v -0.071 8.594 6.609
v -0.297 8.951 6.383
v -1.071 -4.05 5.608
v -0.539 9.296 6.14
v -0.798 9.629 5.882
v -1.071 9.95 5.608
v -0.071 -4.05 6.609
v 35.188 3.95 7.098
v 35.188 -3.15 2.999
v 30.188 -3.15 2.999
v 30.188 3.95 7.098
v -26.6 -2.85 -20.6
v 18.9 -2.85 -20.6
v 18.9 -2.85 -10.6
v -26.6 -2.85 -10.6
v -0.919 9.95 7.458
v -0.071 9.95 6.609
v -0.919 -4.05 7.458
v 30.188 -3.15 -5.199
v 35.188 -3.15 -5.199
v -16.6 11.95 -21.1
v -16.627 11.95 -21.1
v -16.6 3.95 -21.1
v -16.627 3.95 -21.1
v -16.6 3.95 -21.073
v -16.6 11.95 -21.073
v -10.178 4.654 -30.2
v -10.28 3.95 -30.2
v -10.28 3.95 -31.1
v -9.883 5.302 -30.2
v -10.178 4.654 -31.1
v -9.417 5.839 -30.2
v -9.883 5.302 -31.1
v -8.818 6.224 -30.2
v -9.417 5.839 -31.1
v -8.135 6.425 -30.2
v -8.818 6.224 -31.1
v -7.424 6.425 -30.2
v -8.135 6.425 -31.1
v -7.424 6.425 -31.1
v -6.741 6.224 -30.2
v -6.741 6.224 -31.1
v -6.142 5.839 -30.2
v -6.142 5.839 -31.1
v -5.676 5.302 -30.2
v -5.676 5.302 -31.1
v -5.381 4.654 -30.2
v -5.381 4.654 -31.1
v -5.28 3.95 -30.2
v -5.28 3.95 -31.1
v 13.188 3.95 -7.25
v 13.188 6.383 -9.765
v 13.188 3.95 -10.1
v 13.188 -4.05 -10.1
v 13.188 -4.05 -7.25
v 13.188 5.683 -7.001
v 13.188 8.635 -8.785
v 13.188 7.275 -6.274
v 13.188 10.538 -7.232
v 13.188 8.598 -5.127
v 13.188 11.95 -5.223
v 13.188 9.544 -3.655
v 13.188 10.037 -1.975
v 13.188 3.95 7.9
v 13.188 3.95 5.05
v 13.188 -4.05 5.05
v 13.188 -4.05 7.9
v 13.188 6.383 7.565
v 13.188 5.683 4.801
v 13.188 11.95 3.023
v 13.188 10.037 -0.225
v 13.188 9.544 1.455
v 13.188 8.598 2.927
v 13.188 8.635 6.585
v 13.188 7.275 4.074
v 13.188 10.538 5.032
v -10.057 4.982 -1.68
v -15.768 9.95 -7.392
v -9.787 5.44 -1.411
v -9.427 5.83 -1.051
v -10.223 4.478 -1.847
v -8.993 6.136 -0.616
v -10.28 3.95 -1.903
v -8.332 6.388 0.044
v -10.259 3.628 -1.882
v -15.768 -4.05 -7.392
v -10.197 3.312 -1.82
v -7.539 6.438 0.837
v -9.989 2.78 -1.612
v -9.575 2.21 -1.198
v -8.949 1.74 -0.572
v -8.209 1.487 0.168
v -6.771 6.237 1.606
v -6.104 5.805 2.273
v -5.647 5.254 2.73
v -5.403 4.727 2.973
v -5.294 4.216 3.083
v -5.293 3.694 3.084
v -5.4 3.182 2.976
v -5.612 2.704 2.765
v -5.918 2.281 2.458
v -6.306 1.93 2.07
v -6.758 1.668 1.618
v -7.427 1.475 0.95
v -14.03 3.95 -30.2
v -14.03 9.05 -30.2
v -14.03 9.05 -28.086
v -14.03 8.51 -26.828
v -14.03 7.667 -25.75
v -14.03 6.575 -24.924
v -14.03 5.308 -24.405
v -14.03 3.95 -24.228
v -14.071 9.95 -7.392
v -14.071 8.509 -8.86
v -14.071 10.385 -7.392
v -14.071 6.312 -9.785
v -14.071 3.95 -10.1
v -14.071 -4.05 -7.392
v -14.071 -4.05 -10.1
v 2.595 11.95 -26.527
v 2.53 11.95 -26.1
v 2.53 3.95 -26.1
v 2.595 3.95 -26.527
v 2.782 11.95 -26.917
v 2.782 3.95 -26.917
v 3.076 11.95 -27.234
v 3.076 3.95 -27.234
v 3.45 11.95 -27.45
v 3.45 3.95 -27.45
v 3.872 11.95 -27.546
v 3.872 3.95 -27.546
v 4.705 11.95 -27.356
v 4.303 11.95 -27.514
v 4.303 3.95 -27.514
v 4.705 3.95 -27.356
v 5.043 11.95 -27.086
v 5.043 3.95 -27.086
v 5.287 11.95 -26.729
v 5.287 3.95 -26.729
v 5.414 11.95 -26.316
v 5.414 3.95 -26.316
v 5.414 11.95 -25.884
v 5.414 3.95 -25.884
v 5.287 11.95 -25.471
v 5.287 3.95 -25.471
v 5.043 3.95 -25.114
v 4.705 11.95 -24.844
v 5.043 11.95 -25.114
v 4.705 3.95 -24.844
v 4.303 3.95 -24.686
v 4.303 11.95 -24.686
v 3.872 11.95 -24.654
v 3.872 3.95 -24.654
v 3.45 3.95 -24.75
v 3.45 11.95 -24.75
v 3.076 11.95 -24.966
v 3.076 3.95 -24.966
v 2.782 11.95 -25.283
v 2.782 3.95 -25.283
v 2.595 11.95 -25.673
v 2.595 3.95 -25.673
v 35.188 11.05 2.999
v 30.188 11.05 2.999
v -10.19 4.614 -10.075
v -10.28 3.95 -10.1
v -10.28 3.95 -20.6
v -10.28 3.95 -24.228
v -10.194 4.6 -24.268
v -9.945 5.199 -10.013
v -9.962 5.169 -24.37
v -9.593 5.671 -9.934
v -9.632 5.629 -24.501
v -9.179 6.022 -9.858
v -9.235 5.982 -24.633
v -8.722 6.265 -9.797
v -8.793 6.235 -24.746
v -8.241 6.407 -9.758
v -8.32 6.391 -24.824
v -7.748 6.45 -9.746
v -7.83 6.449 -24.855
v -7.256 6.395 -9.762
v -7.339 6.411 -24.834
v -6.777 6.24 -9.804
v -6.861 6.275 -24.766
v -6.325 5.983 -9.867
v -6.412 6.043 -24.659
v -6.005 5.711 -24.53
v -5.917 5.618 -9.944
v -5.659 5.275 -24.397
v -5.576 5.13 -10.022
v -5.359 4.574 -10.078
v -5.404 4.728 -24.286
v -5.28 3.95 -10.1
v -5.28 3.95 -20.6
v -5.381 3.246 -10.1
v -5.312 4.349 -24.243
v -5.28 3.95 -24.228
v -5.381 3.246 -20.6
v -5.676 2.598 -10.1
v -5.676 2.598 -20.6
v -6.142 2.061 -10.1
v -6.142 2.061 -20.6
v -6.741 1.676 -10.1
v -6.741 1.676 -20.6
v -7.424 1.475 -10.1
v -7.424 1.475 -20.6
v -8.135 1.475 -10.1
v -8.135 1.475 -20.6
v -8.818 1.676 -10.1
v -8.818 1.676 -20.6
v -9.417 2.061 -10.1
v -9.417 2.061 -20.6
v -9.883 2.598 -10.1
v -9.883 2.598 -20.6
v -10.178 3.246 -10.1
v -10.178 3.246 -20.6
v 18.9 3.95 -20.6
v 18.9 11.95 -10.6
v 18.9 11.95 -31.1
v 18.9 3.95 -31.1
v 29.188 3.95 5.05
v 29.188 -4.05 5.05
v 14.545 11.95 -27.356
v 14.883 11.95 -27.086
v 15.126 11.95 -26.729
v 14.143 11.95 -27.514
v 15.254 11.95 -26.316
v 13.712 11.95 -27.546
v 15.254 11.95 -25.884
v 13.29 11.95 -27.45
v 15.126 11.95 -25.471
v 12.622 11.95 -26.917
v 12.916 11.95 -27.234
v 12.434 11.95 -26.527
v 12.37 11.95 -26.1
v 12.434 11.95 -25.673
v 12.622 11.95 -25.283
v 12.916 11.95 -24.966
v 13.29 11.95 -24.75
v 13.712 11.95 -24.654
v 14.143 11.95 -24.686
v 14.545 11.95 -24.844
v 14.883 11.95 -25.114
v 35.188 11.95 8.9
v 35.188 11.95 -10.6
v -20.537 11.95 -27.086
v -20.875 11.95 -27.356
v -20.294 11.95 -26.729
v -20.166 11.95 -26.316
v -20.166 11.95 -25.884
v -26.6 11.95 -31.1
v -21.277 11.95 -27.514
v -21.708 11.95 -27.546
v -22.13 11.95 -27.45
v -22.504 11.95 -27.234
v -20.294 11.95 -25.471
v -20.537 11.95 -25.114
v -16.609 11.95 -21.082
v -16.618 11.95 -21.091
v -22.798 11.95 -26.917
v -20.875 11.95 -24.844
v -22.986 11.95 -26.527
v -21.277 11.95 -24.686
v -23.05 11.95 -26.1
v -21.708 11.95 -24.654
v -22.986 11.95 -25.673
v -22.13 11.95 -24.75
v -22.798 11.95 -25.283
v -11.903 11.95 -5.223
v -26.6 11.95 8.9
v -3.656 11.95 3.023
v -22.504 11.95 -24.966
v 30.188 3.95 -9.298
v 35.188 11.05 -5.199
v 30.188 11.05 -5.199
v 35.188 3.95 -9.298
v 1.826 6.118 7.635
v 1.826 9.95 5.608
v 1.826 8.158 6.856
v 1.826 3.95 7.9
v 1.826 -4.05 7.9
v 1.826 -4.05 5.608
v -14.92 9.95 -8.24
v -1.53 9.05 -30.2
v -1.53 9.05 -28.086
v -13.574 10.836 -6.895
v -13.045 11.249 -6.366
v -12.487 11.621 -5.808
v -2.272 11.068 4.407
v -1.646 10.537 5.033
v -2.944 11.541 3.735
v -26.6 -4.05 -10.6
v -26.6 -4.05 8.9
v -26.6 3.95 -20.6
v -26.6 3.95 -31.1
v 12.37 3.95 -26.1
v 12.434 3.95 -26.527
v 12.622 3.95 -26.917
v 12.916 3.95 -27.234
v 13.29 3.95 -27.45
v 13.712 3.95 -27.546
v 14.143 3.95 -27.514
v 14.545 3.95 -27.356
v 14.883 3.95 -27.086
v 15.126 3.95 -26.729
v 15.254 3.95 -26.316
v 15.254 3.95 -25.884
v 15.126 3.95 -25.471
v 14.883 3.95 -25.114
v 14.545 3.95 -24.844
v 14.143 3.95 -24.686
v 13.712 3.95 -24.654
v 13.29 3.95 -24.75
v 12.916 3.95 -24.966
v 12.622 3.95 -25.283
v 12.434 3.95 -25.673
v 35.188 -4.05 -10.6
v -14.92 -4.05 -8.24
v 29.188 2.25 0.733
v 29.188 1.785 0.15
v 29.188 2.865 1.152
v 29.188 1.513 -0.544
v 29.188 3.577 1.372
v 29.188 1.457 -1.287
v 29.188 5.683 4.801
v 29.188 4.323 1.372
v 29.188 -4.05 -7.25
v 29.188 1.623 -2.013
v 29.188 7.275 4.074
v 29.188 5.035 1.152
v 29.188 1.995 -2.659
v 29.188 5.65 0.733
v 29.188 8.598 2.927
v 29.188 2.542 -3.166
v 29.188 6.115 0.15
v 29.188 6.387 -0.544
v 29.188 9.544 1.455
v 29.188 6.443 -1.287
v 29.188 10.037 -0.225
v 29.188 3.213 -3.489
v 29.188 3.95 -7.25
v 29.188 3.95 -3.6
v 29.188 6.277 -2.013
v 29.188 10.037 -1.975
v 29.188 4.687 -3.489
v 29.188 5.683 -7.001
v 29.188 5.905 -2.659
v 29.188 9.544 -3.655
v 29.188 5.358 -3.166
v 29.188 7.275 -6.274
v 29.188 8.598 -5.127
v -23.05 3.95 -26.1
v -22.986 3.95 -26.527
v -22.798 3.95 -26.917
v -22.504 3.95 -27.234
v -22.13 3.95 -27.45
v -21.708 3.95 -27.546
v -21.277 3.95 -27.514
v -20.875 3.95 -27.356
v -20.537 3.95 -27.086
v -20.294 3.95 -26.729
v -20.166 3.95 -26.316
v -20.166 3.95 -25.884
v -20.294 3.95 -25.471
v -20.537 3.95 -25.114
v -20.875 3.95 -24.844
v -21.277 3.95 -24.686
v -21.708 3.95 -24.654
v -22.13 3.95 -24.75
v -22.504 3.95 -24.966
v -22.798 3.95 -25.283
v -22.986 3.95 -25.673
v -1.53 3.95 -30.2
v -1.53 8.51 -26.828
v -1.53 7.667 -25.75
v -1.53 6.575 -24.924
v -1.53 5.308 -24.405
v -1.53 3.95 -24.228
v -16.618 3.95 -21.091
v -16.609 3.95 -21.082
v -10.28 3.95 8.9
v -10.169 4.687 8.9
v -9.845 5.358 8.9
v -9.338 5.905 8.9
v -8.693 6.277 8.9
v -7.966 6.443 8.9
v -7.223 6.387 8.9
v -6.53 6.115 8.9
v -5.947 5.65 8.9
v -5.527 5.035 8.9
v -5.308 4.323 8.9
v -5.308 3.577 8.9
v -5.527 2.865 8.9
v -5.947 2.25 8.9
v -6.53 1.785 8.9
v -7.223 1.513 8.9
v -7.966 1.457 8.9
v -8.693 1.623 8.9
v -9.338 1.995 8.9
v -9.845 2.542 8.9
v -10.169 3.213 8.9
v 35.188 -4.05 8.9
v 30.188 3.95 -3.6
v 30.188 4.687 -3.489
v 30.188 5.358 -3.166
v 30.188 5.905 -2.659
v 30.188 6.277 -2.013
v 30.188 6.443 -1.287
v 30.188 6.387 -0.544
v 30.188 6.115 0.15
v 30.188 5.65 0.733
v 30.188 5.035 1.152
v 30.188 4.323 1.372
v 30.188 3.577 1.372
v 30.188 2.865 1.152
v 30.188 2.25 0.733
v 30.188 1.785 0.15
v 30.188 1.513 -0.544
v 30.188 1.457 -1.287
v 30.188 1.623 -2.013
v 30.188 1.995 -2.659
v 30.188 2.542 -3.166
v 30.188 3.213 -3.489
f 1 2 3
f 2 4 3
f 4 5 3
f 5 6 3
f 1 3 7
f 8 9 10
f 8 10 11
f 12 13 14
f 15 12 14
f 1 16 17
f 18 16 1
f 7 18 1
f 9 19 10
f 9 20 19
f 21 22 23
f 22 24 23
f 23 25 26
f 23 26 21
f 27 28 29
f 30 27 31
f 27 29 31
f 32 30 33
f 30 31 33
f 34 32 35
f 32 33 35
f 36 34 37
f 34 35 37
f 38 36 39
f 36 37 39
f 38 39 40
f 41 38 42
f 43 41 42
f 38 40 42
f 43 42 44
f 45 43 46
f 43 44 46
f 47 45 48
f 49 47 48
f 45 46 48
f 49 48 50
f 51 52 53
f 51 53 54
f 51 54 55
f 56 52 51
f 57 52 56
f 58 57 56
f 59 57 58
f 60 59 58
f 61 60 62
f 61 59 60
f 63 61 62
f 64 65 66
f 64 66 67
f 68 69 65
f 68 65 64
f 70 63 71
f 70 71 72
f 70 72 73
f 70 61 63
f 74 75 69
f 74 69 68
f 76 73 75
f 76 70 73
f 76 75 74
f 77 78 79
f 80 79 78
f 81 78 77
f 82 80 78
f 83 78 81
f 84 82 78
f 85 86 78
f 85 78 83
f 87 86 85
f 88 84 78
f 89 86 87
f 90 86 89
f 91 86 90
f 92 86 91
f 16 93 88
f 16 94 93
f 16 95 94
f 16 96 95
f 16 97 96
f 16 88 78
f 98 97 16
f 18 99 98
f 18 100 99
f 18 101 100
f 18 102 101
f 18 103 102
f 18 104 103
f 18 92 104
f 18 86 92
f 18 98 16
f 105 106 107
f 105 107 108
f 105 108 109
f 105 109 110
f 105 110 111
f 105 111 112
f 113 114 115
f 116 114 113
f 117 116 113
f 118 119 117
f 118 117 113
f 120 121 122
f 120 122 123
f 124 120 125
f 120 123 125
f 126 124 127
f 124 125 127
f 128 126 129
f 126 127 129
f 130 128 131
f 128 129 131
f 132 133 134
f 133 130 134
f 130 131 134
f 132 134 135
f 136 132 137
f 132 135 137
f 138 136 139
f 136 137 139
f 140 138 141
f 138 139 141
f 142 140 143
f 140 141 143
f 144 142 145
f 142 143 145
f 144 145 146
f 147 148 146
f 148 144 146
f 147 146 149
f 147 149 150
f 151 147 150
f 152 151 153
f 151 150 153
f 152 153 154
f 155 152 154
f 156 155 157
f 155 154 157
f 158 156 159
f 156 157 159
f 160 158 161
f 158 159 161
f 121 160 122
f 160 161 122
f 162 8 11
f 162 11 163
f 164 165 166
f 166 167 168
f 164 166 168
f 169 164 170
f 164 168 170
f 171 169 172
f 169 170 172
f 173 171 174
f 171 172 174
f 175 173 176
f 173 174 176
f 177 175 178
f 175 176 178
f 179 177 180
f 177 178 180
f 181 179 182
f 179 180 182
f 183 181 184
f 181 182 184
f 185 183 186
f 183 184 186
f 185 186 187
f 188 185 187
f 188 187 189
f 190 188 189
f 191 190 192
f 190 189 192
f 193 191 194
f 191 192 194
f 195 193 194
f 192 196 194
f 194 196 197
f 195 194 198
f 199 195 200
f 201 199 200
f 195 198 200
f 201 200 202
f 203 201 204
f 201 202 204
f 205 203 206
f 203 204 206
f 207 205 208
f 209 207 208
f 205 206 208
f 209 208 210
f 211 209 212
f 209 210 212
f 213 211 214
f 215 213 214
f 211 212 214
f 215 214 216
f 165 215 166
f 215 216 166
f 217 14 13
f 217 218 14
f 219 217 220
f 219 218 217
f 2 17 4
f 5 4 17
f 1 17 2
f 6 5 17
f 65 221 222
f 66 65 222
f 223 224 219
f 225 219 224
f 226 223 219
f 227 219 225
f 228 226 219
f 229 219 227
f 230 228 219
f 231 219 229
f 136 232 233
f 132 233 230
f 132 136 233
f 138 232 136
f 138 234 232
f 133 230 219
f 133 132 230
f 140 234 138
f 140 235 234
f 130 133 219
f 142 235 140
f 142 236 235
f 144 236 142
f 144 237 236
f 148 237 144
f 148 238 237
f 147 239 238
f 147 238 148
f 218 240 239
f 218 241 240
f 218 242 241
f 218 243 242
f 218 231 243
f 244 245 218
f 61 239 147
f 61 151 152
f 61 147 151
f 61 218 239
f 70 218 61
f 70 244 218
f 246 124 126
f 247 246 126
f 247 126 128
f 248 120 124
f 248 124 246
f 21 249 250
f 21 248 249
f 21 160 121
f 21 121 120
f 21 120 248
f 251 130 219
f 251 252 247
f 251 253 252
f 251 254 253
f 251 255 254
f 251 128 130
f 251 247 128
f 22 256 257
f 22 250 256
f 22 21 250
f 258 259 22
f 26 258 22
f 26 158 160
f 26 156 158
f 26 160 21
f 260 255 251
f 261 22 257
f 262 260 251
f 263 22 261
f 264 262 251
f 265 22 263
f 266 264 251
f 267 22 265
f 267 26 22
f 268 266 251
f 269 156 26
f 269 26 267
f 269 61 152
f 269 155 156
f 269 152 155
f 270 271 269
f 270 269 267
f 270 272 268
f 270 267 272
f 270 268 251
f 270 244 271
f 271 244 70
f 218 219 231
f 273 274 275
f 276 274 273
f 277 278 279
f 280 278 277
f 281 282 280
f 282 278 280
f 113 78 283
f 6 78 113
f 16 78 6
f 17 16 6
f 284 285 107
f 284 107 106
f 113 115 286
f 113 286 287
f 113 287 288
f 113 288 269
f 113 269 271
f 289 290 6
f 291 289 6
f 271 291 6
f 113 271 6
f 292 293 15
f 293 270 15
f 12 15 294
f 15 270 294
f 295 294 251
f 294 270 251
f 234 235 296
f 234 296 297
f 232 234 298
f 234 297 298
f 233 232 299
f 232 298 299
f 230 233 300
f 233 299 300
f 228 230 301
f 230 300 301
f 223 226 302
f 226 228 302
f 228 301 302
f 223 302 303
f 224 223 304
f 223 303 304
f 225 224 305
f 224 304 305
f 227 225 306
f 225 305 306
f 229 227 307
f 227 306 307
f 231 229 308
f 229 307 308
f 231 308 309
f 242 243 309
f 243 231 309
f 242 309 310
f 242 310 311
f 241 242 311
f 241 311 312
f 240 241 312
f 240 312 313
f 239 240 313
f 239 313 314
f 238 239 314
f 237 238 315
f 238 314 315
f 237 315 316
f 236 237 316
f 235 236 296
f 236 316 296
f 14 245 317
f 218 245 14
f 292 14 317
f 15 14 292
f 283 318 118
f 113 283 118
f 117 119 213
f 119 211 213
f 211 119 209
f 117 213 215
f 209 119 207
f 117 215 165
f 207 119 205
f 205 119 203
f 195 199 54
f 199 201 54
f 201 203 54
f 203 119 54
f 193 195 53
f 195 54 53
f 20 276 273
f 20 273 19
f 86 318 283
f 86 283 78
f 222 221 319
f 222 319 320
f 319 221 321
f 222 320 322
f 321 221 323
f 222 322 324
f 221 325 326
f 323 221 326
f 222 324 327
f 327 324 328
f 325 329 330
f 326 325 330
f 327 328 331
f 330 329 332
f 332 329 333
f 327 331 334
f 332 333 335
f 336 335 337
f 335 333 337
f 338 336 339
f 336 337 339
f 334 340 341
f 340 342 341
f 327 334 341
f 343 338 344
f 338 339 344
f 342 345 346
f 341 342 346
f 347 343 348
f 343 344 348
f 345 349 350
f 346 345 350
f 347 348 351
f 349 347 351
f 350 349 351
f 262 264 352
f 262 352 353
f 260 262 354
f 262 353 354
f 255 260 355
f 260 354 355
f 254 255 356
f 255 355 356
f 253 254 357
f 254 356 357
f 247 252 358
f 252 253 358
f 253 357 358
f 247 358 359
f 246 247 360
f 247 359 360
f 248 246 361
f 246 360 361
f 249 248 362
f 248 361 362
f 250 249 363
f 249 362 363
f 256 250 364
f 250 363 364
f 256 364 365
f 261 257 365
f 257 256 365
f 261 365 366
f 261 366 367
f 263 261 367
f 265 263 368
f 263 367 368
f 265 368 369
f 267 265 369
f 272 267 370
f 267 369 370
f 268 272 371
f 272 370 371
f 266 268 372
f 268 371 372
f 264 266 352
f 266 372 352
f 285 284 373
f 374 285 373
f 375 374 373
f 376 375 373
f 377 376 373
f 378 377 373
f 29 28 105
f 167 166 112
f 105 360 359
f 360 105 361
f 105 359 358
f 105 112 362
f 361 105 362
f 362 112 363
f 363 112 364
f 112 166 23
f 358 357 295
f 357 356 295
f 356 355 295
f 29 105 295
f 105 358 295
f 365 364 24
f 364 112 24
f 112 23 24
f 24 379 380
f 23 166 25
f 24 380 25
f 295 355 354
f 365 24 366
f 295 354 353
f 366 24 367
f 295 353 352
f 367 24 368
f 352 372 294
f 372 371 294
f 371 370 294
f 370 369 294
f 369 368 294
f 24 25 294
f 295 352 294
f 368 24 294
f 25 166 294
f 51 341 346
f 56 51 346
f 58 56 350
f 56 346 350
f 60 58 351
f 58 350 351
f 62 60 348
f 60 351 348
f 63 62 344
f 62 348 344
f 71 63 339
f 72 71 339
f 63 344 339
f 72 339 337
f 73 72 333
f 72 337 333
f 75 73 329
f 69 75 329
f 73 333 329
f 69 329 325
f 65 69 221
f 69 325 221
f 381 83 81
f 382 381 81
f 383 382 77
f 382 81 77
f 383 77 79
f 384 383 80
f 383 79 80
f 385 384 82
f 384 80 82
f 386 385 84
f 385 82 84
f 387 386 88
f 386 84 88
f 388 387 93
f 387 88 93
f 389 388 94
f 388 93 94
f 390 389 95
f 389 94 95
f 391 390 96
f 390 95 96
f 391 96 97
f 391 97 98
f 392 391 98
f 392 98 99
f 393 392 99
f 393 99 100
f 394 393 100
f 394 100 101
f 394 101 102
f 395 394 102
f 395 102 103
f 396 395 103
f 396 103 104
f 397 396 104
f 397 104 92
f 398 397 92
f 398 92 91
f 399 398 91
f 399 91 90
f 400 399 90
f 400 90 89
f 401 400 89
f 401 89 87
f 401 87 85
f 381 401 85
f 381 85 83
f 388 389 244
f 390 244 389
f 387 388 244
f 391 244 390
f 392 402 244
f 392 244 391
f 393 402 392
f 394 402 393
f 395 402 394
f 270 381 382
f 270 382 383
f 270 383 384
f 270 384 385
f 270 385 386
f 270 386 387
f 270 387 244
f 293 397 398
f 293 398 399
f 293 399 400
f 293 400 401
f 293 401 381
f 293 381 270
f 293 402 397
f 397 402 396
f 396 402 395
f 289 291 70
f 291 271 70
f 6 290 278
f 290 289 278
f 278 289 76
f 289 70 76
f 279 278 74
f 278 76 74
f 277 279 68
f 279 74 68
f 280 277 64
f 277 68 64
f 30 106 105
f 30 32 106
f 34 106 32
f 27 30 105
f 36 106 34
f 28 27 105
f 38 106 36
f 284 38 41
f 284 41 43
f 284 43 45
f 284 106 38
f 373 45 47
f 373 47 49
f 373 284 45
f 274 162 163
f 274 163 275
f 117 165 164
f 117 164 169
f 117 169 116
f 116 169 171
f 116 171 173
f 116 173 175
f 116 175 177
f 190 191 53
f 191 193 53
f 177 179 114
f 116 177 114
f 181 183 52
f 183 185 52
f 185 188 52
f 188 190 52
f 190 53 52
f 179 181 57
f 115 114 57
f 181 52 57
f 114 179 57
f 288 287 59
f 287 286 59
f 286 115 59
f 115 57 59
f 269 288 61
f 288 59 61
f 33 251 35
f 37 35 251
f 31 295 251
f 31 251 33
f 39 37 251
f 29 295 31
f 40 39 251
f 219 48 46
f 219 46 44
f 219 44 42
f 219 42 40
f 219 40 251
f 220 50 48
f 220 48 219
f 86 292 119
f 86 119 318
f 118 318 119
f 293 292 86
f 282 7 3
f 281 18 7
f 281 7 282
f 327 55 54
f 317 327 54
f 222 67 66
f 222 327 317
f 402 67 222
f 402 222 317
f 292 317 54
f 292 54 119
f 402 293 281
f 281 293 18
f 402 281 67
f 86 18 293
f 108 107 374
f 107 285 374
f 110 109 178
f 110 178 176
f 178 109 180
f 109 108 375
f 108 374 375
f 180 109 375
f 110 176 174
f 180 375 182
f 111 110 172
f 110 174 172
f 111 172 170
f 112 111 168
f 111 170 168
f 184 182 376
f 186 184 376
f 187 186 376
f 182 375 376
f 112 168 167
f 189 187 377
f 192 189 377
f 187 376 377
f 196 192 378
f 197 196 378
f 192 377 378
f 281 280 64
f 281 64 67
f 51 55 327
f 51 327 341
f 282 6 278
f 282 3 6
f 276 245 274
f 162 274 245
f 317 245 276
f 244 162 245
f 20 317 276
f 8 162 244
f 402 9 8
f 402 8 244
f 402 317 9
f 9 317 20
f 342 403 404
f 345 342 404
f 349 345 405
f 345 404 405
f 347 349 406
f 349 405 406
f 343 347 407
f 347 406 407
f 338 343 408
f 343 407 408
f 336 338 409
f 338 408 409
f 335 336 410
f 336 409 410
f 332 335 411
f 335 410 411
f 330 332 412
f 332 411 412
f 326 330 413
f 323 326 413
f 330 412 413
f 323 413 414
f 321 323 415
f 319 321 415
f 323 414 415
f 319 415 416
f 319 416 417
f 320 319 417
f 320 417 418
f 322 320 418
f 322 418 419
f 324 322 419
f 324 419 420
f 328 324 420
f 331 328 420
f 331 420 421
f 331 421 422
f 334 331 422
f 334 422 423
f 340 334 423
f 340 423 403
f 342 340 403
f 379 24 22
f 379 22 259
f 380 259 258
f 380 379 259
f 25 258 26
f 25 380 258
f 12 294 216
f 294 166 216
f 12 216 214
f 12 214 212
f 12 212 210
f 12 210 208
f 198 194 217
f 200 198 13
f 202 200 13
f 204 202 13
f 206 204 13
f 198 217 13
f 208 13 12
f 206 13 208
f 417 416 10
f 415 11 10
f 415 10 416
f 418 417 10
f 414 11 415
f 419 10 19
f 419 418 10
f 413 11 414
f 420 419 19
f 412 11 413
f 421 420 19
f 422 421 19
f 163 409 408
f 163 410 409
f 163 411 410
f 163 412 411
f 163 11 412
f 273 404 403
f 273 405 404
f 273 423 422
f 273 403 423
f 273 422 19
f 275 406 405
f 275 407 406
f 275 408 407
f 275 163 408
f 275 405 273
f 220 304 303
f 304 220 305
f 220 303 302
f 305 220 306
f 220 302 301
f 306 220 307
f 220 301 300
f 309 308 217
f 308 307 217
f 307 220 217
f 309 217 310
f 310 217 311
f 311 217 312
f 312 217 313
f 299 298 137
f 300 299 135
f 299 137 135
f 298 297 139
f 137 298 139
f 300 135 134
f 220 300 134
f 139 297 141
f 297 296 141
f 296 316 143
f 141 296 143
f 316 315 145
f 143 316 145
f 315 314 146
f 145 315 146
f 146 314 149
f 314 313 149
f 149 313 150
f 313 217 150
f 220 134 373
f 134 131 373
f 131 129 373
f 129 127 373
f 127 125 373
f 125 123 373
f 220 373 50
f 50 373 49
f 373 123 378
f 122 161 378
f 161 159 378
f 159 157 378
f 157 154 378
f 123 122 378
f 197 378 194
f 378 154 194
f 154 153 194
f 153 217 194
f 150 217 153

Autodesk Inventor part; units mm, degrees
ref_plane "Arbeitsebene6" through (18.9, 3.95, -31.1) normal (0, 1, 0) x (-1, 0, 0)
sketch "Skizze13" plane through (18.9, 3.95, -31.1) normal (0, 1, 0) x (-1, 0, 0)
  circle A0 centre (40.5, 5) radius 1.45 projected
  line L0 (29.1796, 0.9) -> (29.1796, 0) projected
  line L1 (45.5, 0) -> (29.1796, 0) projected
  line L2 (45.5, 0) -> (45.5, 10) projected
  line L3 (45.5, 10) -> (29.1796, 10) projected
  line L4 (29.1796, 10) -> (29.1796, 6.8717) projected
  line L5 (29.1796, 6.8717) -> (32.9296, 6.8717) projected
  line L6 (32.9296, 6.8717) -> (32.9296, 0.9) projected
  line L7 (32.9296, 0.9) -> (29.1796, 0.9) projected
  line L8 (24.1796, 0) -> (24.1796, 0.9) projected
  line L9 (24.1796, 0.9) -> (20.4296, 0.9) projected
  line L10 (20.4296, 0.9) -> (20.4296, 6.8717) projected
  line L11 (20.4296, 6.8717) -> (24.1796, 6.8717) projected
  line L12 (24.1796, 6.8717) -> (24.1796, 10) projected
  line L13 (24.1796, 10) -> (0, 10) projected
  line L14 (0, 0) -> (0, 10) projected
  line L15 (24.1796, 0) -> (0, 0) projected
  circle A1 centre (14.9199, 5) radius 1.45 projected
  circle A2 centre (5.0801, 5) radius 1.45 projected
  line L16 (29.1796, 10) -> (24.1796, 10)
  line L17 (29.1796, 0) -> (24.1796, 0)
  line L18 (55.5, 0) -> (55.5, 10) projected
  line L19 (55.5, 10) -> (55.473, 10) projected
  line L20 (55.473, 10) -> (55.473, 40) projected
  line L21 (55.473, 40) -> (45.5, 40) projected
  line L22 (45.5, 40) -> (45.5, 20) projected
  line L23 (45.5, 20) -> (35.5, 20) projected
  line L24 (35.5, 20) -> (35.5, 10.0274) projected
  arc A3 (35.5, 10.0274) -> (35.527, 10) centre (40.5, 14.9264) ccw projected
  line L25 (45.5, 10) -> (35.527, 10) projected
  line L26 (45.5, 0) -> (45.5, 10) projected
  line L27 (45.5, 0) -> (55.5, 0) projected
  line L28 (52.073, 16.5) -> (52.073, 3.5) projected
  arc A4 (48.873, 3.5) -> (52.073, 3.5) centre (50.473, 3.5) ccw projected
  line L29 (48.873, 3.5) -> (48.873, 16.5) projected
  arc A5 (52.073, 16.5) -> (48.873, 16.5) centre (50.473, 16.5) ccw projected
  line L30 (48.8865, 23.1111) -> (48.8865, 36.1111) projected
  arc A6 (52.0865, 36.1111) -> (48.8865, 36.1111) centre (50.4865, 36.1111) ccw projected
  line L31 (52.0865, 36.1111) -> (52.0865, 23.1111) projected
  arc A7 (48.8865, 23.1111) -> (52.0865, 23.1111) centre (50.4865, 23.1111) ccw projected
  line L32 (-10, 0) -> (0, 0) projected
  line L33 (0, 10) -> (0, 0) projected
  line L34 (16, 10) -> (0, 10) projected
  line L35 (16, 10) -> (16, 20) projected
  line L36 (16, 20) -> (-10, 20) projected
  line L37 (-10, 20) -> (-10, 0) projected
  line L38 (-3.4, 16.5) -> (-3.4, 3.5) projected
  arc A8 (-6.6, 3.5) -> (-3.4, 3.5) centre (-5, 3.5) ccw projected
  line L39 (-6.6, 3.5) -> (-6.6, 16.5) projected
  arc A9 (-3.4, 16.5) -> (-6.6, 16.5) centre (-5, 16.5) ccw projected
  line L40 (-16.2879, 40) -> (45.5, 40)
  line L41 (45.5, 40) -> (45.5, 20.5)
  line L42 (45.5, 20.5) -> (-16.2879, 20.5)
  line L43 (-16.2879, 20.5) -> (-16.2879, 40)
  line L44 (45.5, 20.5) -> (35.5, 20.5)
  line L45 (35.5, 20.5) -> (35.5, 20)
  line L46 (35.5, 20) -> (45.5, 20)
  line L47 (45.5, 20) -> (45.5, 20.5)
  line L48 (16, 20) -> (0, 20)
  line L49 (0, 20) -> (0, 20.5)
  line L50 (0, 20.5) -> (16, 20.5)
  line L51 (16, 20.5) -> (16, 20)
  line L52 (0, 20) -> (0, 10)
  line L53 (35.5, 10) -> (45.5, 10)
  line L54 (45.5, 10) -> (45.5, 20.5)
  line L55 (45.5, 20.5) -> (35.5, 20.5)
  line L56 (35.5, 20.5) -> (35.5, 10)
  point P0 (0, 20)
  point P1 (0.5252, 10)
  point P2 (35.527, 10)
  point P3 (0, 20)
  point P4 (35.5, 10.0274)
  dimension "d60" = 0.5
extrude "Extrusion12" add sketch "Skizze13" along normal blind 8 contours L7 L6 L5 L4 L3 L2 L1 L0 | L0 L17 L8 L9 L10 L11 L12 L16 L4 L5 L6 L7 | L15 L14 L13 L12 L11 L10 L9 L8 | L3 A3 L24 L23 L54 | L23 L45 L42 L22 | L52 L36 L35 L13 | L16 L13 L35 L51 L42 L45 L24 L56 L3 | L42 L43 L40 L22 | L49 L42 L51 L36
sketch "Skizze16" plane through (18.9, 3.95, -31.1) normal (0, -1, 0) x (1, 0, 0)
  line L0 (16.2879, 20.5) -> (0, 20.5) projected
  line L1 (-45.5, 0) -> (-45.5, 40) projected
  circle A0 centre (-5.0801, 5) radius 1.45 projected
  circle A1 centre (-14.9199, 5) radius 1.45 projected
  line L2 (-16, 20) -> (10, 20) projected
  line L3 (-66.9798, -10.3003) -> (9.2505, 65.9301)
  line L4 (16.2879, 20.5) -> (0, 20.5) projected
  line L5 (16.2879, 20.5) -> (-45.5, 20.5)
  line L6 (-45.5, 20.5) -> (-45.5, 40)
  line L7 (-45.5, 40) -> (16.2879, 40)
  line L8 (16.2879, 40) -> (16.2879, 20.5)
  line L9 (0, 20.5) -> (0, 0) projected
  line L10 (16.2879, 40) -> (16.2879, 20.5) projected
  line L11 (-45.5, 40) -> (16.2879, 40) projected
  line L12 (0, 0) -> (-45.5, 0) projected
  point P0 (-18.9, 31.1)
extrude "Extrusion13" add sketch "Skizze16" along normal blind 8 contours L0 L5 L3 L7 L8 | L5 L1 L7 L3
ref_plane "Arbeitsebene7" through (-7.7796, -1.85, -37.9251) normal (1, 0, 0) x (0, -1, 0)
sketch "Skizze18" plane through (-7.7796, -1.85, -37.9251) normal (1, 0, 0) x (0, -1, 0)
  arc A0 (-5.8, -13.6968) -> (-0.7, -9.8391) centre (-5.8, -8.3968) ccw projected
  line L0 (-0.7, -9.8391) -> (-0.7, -7.7251) projected
  arc A1 (-10.8, -9.8251) -> (-0.8, -9.8251) centre (-5.8, -8.3968) ccw projected
  line L1 (-0.8, -7.8251) -> (-0.8, -9.8251) projected
  line L2 (-10.8, -7.8251) -> (-0.8, -7.8251) projected
  line L3 (-10.8, -9.8251) -> (-10.8, -7.8251) projected
  arc A2 (-10.9, -9.8391) -> (-0.7, -9.8391) centre (-5.8, -8.3968) ccw
  line L4 (-10.9, -9.8391) -> (-10.9, -7.7251)
  line L5 (-10.9, -7.7251) -> (-0.7, -7.7251)
  line L6 (-0.7, -7.7251) -> (-0.7, -9.8391)
  point P0 (-1.85, -37.9251)
  point P1 (-5.8, -13.6968)
extrude "Extrusion15" cut sketch "Skizze18" along normal mid plane 12.5 contours A2 L4 L5 L0 A0 | L3 L2 L1 A1
sketch "Skizze19" plane through (35.1879, 11.95, 8.9) normal (1, 0, 0) x (0, 0, -1)
  circle A0 centre (10, -8) radius 7 projected
  circle A1 centre (10, -8) radius 7.1
  line L0 (14.0992, -15.1) -> (5.9008, -15.1)
  line L1 (5.9008, -15.1) -> (1.8016, -8)
  line L2 (1.8016, -8) -> (5.9008, -0.9)
  line L3 (5.9008, -0.9) -> (14.0992, -0.9)
  line L4 (14.0992, -0.9) -> (18.1984, -8)
  line L5 (18.1984, -8) -> (14.0992, -15.1)
  line L6 (19.5, -16) -> (0, -16) projected
  point P0 (8.9, -11.95)
  dimension "d68" = 0.1
ref_plane "Arbeitsebene8" through (22.1204, -2.15, -7.2) normal (1, 0, 0) x (0, 1, 0)
extrude "Extrusion16" cut sketch "Skizze19" against normal blind 5 contours A0 | A1 | A1 L4 L5 | A1 L3 L4 | L5 L0 A1 | A1 L2 L3 | L0 L1 A1 | A1 L1 L2
sketch "Skizze20" plane through (30.1879, 11.05, 2.9992) normal (1, 0, 0) x (0, 0, -1)
  arc A0 (6.1223, -12.104) -> (2.4773, -12.2481) centre (4.0992, -7.1) ccw projected
  circle A1 centre (4.0992, -7.1) radius 6.15
  line L0 (10.2492, -7.1) -> (-2.0508, -7.1)
  line L1 (-2.0508, -7.1) -> (-2.0508, -16.2052)
  line L2 (-2.0508, -16.2052) -> (10.2492, -16.2052)
  line L3 (10.2492, -16.2052) -> (10.2492, -7.1)
  point P0 (2.9992, -11.05)
  point P1 (-2.0508, -7.1)
  dimension "d71" = 12.3
ref_plane "Arbeitsebene9" through (-36.7921, -9.8415, -30.1125) normal (-0.7071, 0, 0.7071) x (0.7071, 0, 0.7071)
extrude "Extrusion17" cut sketch "Skizze20" against normal up to surface surface through (-36.7921, -9.8415, -30.1125) normal (-0.7071, 0, 0.7071)
ref_plane "Arbeitsebene10" through (13.1879, 11.05, 2.9992) normal (-1, 0, 0) x (0, 0, 1)
sketch "Skizze21" plane through (13.1879, 11.05, 2.9992) normal (-1, 0, 0) x (0, 0, 1)
  arc A0 (-3.1969, -9.9981) -> (-5.2274, -9.9178) centre (-4.0992, -7.1) ccw projected
  circle A1 centre (-4.0992, -7.1) radius 9
  line L0 (-13.0992, -7.1) -> (4.9008, -7.1)
  line L1 (4.9008, -7.1) -> (4.9008, -20.07)
  line L2 (4.9008, -20.07) -> (-13.0992, -20.07)
  line L3 (-13.0992, -20.07) -> (-13.0992, -7.1)
  point P0 (-2.9992, -11.05)
  dimension "d75" = 18
ref_plane "Arbeitsebene11" through (-36.7921, -9.8415, -30.1125) normal (-0.7071, 0, 0.7071) x (0.7071, 0, 0.7071)
extrude "Extrusion18" cut sketch "Skizze21" along normal up to surface surface through (-36.7921, -9.8415, -30.1125) normal (-0.7071, 0, 0.7071)
sketch "Skizze22" plane through (18.9, -4.05, -31.1) normal (0, -1, 0) x (1, 0, 0)
  line L0 (-45.5, 20.5) -> (16.2879, 20.5) projected
  line L1 (-45.5, 40) -> (-45.5, 20.5) projected
  line L2 (-34.6684, 23.7083) -> (-19.8191, 38.5575)
  line L3 (-19.8191, 38.5575) -> (-18.9706, 37.709)
  line L4 (-18.9706, 37.709) -> (-33.8198, 22.8597)
  line L5 (-33.8198, 22.8597) -> (-34.6684, 23.7083)
  line L6 (-34.6684, 23.7083) -> (-18.9706, 37.709) construction
  line L7 (-19.8191, 38.5575) -> (-33.8198, 22.8597) construction
  line L8 (-34.6684, 23.7083) -> (-13.6684, 23.7083) construction
  line L9 (16.2879, 40) -> (-45.5, 40) projected
  line L10 (16.2879, 20.5) -> (16.2879, 40) projected
  point P0 (-18.9, 31.1)
  point P1 (-26.8195, 30.7086)
  dimension "d78" = 21
  dimension "d79" = 45
  dimension "d80" = 1.2
extrude "Extrusion19" cut sketch "Skizze22" against normal blind 14 contours L2 L3 L4 L5
sketch "Skizze23" plane through (18.9, -4.05, -31.1) normal (0, -1, 0) x (1, 0, 0)
  line L0 (-45.5, 20.5) -> (16.2879, 20.5) projected
  line L1 (-45.5, 40) -> (-45.5, 20.5) projected
  line L2 (-35.6796, 21) -> (-32.9713, 23.7083)
  line L3 (-33.3878, 23.2918) -> (-30.8027, 25.8769) projected
  line L4 (-5.7121, 21) -> (-35.6796, 21) projected
  line L5 (-32.9713, 21) -> (-32.9713, 23.7083)
  line L6 (-18.9706, 37.709) -> (-19.9714, 36.7082) projected
  line L7 (-19.9714, 36.7082) -> (-17.0744, 36.7082)
  line L8 (-17.0744, 36.7082) -> (-17.0744, 39)
  line L9 (-18.9706, 37.709) -> (-19.9714, 36.7082) projected
  line L10 (-19.9714, 36.7082) -> (-17.6796, 39)
  line L11 (-17.6796, 39) -> (-17.0744, 39)
  line L12 (16.2879, 40) -> (-45.5, 40) projected
  line L13 (16.2879, 20.5) -> (16.2879, 40) projected
  point P0 (-18.9, 31.1)
  point P1 (-29.1796, 21)
extrude "Extrusion20" add sketch "Skizze23" against normal up to surface (16 mm away) contours L2 L5 L4 | L10 L11 L8 L7 L6
sketch "Skizze24" plane through (30.1879, 11.95, 8.9) normal (1, 0, 0) x (0, 0, -1)
  arc A0 (16.15, -8) -> (3.85, -8) centre (10, -8) ccw projected
  circle A1 centre (10, -8) radius 2.5 projected
  circle A2 centre (10, -8) radius 6.15
  line L0 (14.0992, -0.9) -> (18.1984, -8) projected
  line L1 (18.1984, -8) -> (14.0992, -15.1) projected
  line L2 (14.0992, -15.1) -> (5.9008, -15.1) projected
  line L3 (5.9008, -15.1) -> (1.8016, -8) projected
  line L4 (1.8016, -8) -> (5.9008, -0.9) projected
  line L5 (5.9008, -0.9) -> (14.0992, -0.9) projected
  line L6 (19.5, -16) -> (19.5, 0) projected
  line L7 (0, 0) -> (19.5, 0) projected
  line L8 (0, -16) -> (0, 0) projected
  line L9 (19.5, -16) -> (0, -16) projected
  point P0 (8.9, -11.95)
extrude "Extrusion21" add sketch "Skizze24" against normal blind 1 contours A2 A0 | L0 L1 L2 L3 L4 L5 | L9 L8 L7 L6
ref_plane "Arbeitsebene12" through (-26.6, -8.85, -11.1) normal (1, 0, 0) x (0, 1, 0)
sketch "Skizze25" plane through (18.9, 3.95, -10.6) normal (1, 0, 0) x (0, 0, -1)
  line L0 (0.5, -6.8) -> (20.5, -6.8) projected
  line L1 (0, -8) -> (0, 8) projected
  line L2 (0, 0) -> (10.5, 0) projected
  line L3 (0, 0) -> (10, 0)
  line L4 (10, 0) -> (10, -6.8)
  line L5 (10, -6.8) -> (0, -6.8)
  line L6 (0, -6.8) -> (0, 0)
  line L7 (10.5, 0) -> (10.5, -6.8) projected
  point P0 (-10.6, -3.95)
  point P1 (0, -6.8)
  dimension "d87" = 0.5
extrude "Extrusion22" add sketch "Skizze25" against normal up to surface (45.5 mm away) contours L5 L1 L2 L4 L0
sketch "Skizze26" plane through (18.9, 11.95, -31.1) normal (0, 0, -1) x (-1, 0, 0)
  line L0 (0, -8) -> (24.1796, -8) projected
  line L1 (0, 0) -> (24.1796, 0) projected
  line L2 (0, -8) -> (0, 0) projected
  line L3 (24.1796, -8) -> (29.1796, -8) projected
  circle A0 centre (26.6796, -8) radius 2.5
  line L4 (24.1796, -8) -> (24.1796, 0) projected
  point P0 (18.9, -11.95)
extrude "Extrusion23" cut sketch "Skizze26" against normal through all contours A0 L3 | L3 A0
properties part number "30_Lightsheet_generator_passive_lid_v0"
